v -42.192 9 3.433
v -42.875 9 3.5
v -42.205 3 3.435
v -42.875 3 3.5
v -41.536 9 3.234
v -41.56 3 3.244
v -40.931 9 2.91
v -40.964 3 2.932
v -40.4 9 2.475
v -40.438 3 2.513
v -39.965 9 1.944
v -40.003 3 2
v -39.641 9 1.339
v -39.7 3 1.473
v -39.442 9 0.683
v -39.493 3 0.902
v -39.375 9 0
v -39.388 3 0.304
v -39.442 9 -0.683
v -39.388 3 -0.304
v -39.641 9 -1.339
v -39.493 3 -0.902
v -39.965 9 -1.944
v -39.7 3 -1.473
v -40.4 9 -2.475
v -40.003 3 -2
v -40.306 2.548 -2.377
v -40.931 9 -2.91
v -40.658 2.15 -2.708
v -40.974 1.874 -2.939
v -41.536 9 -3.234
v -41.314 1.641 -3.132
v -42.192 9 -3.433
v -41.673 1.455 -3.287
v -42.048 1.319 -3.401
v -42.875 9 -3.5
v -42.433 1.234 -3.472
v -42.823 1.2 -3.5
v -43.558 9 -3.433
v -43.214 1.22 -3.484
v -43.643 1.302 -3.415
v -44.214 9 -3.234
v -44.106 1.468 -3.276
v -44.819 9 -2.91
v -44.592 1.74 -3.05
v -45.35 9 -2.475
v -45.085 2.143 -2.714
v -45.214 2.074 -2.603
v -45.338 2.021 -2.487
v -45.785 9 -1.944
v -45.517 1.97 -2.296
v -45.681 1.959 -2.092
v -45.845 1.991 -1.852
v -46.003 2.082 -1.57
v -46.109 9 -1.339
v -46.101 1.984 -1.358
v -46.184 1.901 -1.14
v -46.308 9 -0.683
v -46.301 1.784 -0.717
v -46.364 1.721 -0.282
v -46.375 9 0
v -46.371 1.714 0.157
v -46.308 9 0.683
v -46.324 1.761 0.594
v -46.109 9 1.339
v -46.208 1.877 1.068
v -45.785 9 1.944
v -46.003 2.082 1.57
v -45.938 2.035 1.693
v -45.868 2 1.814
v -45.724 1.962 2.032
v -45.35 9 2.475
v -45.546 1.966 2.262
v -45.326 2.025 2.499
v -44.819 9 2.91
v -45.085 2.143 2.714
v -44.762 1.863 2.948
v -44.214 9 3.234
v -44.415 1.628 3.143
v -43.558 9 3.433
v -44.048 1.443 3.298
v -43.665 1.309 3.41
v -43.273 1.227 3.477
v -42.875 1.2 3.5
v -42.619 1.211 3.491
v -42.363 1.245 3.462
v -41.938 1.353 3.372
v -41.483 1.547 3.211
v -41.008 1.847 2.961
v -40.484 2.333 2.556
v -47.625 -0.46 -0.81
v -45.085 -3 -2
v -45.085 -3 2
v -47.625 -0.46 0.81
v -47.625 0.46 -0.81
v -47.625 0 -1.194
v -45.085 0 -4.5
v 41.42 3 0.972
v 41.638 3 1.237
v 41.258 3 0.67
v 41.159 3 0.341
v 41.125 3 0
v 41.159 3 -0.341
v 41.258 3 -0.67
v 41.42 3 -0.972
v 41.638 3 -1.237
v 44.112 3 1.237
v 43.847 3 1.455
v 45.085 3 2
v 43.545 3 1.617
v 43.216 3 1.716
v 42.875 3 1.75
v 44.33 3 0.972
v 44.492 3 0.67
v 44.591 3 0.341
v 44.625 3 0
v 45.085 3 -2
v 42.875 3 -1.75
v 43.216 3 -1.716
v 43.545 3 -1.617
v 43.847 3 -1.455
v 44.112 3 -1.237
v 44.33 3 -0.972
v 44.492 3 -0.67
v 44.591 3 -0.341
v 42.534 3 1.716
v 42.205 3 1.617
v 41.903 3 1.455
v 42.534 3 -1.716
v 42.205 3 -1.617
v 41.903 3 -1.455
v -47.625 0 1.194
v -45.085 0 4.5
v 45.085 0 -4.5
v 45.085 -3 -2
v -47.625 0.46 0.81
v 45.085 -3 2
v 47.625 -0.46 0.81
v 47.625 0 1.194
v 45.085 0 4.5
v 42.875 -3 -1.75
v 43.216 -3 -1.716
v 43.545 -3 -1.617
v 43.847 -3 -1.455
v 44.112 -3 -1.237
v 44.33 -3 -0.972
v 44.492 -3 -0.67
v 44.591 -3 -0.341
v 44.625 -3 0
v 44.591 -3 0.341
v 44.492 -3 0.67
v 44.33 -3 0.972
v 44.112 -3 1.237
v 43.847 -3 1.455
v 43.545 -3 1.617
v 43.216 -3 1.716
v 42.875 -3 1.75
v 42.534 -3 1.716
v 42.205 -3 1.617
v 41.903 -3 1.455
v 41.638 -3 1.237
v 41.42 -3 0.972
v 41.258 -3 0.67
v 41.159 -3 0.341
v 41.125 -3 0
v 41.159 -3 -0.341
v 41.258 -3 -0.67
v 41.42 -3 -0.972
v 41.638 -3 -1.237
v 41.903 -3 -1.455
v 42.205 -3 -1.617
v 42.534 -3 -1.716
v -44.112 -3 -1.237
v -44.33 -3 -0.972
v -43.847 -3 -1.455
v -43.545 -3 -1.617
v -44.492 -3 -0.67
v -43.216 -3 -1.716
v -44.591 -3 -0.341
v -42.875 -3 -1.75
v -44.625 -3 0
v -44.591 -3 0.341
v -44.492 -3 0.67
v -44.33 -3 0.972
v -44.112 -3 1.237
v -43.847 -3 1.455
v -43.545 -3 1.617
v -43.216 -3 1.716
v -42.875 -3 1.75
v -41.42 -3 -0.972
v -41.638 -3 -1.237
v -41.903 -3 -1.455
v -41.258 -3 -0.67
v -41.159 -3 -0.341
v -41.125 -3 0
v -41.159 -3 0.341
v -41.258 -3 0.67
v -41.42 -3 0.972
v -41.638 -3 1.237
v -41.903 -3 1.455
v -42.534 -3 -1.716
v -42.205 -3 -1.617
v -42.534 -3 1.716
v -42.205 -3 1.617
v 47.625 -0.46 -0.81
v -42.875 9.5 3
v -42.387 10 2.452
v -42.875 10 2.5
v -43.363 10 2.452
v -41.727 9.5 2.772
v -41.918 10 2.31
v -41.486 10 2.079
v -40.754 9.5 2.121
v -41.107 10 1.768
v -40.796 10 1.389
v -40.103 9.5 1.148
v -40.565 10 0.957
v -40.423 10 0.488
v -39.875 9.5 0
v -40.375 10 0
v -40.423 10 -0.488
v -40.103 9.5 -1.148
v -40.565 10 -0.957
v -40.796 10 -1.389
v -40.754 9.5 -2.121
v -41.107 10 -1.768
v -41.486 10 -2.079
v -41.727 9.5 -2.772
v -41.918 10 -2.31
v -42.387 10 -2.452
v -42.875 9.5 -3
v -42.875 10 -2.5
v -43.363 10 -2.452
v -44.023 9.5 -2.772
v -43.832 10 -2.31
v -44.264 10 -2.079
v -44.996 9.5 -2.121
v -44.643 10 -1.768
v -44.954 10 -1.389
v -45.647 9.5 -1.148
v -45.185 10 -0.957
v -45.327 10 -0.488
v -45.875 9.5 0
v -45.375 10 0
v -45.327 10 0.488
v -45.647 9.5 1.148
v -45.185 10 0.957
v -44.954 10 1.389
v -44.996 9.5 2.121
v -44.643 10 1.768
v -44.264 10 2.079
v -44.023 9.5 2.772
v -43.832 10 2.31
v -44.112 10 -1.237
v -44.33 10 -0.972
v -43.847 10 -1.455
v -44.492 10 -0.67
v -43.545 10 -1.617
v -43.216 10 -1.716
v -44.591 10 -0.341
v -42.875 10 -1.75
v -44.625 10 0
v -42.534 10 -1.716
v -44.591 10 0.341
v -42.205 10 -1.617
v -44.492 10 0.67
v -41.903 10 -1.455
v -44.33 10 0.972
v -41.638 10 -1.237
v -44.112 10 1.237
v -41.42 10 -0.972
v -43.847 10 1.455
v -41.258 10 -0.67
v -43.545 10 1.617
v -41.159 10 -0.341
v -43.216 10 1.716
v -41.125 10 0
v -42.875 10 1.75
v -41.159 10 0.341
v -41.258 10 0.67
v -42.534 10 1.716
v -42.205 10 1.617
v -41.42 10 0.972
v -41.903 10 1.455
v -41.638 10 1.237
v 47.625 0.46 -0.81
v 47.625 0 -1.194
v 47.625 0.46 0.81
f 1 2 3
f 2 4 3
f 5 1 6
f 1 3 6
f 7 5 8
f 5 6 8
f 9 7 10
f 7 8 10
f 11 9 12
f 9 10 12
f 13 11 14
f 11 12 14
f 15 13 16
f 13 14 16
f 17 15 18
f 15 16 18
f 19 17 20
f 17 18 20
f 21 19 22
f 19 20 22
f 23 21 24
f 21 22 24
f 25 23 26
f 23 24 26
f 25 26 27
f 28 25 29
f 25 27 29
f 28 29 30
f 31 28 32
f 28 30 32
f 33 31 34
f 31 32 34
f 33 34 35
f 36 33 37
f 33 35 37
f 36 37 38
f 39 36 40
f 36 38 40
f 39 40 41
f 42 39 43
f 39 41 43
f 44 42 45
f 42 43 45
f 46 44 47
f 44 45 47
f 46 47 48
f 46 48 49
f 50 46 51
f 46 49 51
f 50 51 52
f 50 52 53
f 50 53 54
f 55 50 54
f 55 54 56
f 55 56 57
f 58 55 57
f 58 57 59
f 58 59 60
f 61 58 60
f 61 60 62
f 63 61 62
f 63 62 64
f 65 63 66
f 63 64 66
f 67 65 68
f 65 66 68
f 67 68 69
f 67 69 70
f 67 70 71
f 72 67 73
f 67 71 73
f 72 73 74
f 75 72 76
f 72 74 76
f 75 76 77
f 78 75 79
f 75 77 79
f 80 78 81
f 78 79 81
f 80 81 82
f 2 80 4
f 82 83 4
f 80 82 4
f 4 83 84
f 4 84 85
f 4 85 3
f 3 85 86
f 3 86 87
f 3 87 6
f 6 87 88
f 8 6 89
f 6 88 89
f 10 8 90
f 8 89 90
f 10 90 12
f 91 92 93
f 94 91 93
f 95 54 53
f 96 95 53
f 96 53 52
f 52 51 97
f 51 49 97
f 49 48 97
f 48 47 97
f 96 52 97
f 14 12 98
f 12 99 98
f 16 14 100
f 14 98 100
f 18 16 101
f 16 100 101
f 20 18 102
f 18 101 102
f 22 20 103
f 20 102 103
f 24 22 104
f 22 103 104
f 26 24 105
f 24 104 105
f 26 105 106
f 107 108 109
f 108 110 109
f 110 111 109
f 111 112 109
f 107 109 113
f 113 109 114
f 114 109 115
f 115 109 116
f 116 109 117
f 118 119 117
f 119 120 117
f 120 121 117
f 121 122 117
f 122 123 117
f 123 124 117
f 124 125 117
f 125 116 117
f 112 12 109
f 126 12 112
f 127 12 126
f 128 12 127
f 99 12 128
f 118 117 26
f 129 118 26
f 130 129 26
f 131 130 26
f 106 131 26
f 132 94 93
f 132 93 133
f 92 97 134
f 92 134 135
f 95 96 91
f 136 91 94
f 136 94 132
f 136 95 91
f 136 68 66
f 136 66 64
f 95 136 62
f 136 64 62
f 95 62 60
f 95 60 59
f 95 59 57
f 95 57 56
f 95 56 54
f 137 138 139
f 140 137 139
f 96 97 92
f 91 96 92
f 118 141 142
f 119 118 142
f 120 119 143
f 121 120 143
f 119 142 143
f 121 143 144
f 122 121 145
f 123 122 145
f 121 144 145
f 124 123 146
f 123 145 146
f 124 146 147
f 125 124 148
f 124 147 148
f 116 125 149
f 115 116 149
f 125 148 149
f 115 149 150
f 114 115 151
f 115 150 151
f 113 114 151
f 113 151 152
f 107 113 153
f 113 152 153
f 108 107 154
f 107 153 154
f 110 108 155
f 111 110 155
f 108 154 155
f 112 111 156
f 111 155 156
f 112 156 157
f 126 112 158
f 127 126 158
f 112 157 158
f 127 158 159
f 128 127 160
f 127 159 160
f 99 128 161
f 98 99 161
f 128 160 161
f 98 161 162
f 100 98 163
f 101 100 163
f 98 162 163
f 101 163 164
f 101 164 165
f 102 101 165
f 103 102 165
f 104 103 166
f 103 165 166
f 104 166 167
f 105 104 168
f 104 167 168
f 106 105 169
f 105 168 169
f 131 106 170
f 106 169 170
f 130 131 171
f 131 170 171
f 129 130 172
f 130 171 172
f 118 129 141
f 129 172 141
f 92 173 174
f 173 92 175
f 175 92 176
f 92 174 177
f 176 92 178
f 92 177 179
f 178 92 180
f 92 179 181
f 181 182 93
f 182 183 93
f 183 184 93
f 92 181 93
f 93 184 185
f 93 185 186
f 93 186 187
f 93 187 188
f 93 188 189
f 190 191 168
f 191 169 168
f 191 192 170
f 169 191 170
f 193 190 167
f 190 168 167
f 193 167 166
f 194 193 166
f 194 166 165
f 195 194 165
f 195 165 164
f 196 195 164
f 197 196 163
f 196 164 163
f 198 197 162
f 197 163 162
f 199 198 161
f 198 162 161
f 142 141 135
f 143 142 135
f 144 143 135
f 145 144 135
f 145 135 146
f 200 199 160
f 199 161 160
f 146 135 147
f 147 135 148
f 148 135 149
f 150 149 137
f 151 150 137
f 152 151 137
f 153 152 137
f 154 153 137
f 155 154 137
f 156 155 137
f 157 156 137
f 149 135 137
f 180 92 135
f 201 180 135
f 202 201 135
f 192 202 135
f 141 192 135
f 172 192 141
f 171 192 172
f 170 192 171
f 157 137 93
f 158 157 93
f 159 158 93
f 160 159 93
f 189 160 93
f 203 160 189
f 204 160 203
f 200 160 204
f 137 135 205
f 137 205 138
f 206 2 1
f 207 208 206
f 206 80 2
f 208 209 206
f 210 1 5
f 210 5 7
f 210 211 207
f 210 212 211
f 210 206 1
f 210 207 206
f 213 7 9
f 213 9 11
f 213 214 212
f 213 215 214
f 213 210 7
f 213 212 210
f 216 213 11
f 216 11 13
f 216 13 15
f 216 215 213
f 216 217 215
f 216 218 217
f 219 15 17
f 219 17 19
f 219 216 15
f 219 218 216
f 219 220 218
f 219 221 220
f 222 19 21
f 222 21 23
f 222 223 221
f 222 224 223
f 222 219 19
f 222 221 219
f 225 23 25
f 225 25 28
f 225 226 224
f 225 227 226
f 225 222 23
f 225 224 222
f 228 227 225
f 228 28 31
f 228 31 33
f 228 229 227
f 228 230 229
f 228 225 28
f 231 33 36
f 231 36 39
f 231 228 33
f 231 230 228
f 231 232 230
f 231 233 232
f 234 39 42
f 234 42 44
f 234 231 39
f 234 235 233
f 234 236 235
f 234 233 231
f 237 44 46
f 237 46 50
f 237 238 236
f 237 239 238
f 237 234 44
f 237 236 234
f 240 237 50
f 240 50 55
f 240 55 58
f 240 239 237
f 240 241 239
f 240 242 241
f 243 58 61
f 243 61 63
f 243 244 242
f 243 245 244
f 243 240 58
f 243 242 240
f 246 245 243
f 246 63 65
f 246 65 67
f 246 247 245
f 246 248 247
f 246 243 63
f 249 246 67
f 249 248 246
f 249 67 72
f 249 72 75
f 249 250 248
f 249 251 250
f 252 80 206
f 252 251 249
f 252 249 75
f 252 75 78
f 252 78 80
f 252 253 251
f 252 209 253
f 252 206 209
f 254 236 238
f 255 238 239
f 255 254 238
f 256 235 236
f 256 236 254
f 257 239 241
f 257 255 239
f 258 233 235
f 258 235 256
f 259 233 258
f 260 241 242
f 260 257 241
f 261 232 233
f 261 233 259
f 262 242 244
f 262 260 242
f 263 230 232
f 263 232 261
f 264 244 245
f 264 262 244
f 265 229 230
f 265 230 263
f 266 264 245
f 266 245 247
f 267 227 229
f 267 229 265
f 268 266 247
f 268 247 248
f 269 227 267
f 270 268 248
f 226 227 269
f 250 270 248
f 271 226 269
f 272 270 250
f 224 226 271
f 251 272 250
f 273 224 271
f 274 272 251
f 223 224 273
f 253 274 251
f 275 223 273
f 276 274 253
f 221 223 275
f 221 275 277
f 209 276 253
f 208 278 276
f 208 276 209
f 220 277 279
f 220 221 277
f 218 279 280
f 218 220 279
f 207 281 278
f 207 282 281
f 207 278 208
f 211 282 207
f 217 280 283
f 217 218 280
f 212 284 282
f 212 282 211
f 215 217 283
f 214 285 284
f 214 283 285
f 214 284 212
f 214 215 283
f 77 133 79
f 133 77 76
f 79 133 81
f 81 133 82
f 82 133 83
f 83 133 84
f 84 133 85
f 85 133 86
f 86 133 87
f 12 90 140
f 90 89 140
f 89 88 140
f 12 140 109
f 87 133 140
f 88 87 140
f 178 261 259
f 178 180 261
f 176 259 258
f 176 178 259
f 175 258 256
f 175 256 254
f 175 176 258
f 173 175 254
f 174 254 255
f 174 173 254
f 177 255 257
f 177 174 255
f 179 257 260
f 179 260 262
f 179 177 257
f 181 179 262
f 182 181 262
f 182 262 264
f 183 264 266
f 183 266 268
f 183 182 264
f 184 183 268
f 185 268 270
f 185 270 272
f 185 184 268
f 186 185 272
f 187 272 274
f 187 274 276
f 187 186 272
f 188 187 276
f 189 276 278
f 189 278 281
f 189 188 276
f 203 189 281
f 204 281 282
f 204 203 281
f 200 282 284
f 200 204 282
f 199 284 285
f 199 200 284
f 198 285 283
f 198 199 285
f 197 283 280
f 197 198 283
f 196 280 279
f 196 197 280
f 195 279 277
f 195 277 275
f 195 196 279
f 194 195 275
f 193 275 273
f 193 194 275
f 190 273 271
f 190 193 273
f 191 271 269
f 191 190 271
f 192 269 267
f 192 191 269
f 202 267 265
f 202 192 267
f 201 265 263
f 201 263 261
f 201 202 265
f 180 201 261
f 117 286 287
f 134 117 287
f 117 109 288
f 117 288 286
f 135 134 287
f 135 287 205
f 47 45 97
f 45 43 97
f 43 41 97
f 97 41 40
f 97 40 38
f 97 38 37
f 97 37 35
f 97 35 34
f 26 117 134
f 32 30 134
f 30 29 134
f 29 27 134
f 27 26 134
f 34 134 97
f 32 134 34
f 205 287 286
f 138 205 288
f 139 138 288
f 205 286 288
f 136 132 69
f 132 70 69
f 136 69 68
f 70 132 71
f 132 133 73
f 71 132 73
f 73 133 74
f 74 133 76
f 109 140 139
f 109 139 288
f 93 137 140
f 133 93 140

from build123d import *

# Parameters (mm, degrees)
BOSS_EXTRUDE1_DEPTH             = 47.625
SKETCH2_R                       = 1.75
CUT_EXTRUDE1_DEPTH              = 6
CHAMFER1_SIZE                   = 2.54
CHAMFER2_SIZE                   = 2.54
SKETCH3_R                       = 3.5
SKETCH3_R_2                     = 1.75
BOSS_EXTRUDE2_DEPTH             = 7
BOSS_EXTRUDE2_DIRECTION_2_REACH = 50.212
CHAMFER3_SIZE                   = 1


with BuildPart() as part:
    # Sketch1 → Boss-Extrude1 (new, symmetric)
    with BuildSketch(Plane(origin=(0, 0, 0), x_dir=(0, 0, -1), z_dir=(1, 0, 0))):
        Polygon((-2, -3), (-4.5, 0), (-2, 3), (2, 3), (4.5, 0), (2, -3), align=None)
    extrude(amount=BOSS_EXTRUDE1_DEPTH, both=True)

    # Sketch2 → Cut-Extrude1 (cut)
    with BuildSketch(Plane.XZ.offset(3)):
        with Locations(Location((42.875, 0, 0), (0, 0, 270))):
            Circle(SKETCH2_R)
    cut_extrude1 = extrude(amount=-CUT_EXTRUDE1_DEPTH, mode=Mode.SUBTRACT)

    # Chamfer1
    chamfer1_edges = [part.edges().sort_by_distance(p)[0] for p in [
        (47.625, -1.5, -3.25),
        (47.625, -3, 0),
        (47.625, -1.5, 3.25),
        (47.625, 1.5, 3.25),
        (47.625, 3, 0),
        (47.625, 1.5, -3.25),
    ]]
    chamfer(chamfer1_edges, length=CHAMFER1_SIZE)

    # Mirror4: Cut-Extrude1 across plane
    add(cut_extrude1.mirror(Plane(origin=(0, 0, 0), x_dir=(0, 0, 1), z_dir=(1, 0, 0))), mode=Mode.SUBTRACT)

    # Chamfer2
    chamfer2_edges = [part.edges().sort_by_distance(p)[0] for p in [
        (-47.625, 1.5, 3.25),
        (-47.625, -1.5, 3.25),
        (-47.625, -3, 0),
        (-47.625, -1.5, -3.25),
        (-47.625, 1.5, -3.25),
        (-47.625, 3, 0),
    ]]
    chamfer(chamfer2_edges, length=CHAMFER2_SIZE)

    # Sketch3 → Boss-Extrude2 (add)
    with BuildSketch(Plane(origin=(0, 3, 0), x_dir=(1, 0, 0), z_dir=(0, 1, 0))):
        with Locations(Location((-42.875, 0, 0), (0, 0, 270))):
            Circle(SKETCH3_R)
        with Locations(Location((-42.875, 0, 0), (0, 0, 90))):
            Circle(SKETCH3_R_2, mode=Mode.SUBTRACT)
    extrude(amount=BOSS_EXTRUDE2_DEPTH)

    # Sketch3 → Boss-Extrude2 direction 2 (add, up to next)
    with BuildSketch(Plane(origin=(0, 3, 0), x_dir=(1, 0, 0), z_dir=(0, 1, 0)), mode=Mode.PRIVATE) as boss_extrude2_direction_2_sk1:
        with Locations(Location((-42.875, 0, 0), (0, 0, 270))):
            Circle(SKETCH3_R)
        with Locations(Location((-42.875, 0, 0), (0, 0, 90))):
            Circle(SKETCH3_R_2, mode=Mode.SUBTRACT)
    boss_extrude2_direction_2_tool1 = extrude(boss_extrude2_direction_2_sk1.sketch, amount=-BOSS_EXTRUDE2_DIRECTION_2_REACH, mode=Mode.PRIVATE) - part.part
    add(boss_extrude2_direction_2_tool1.solids().sort_by_distance((-42.875, 3, -3.401005))[0])

    # Chamfer3
    chamfer3_edges = [part.edges().sort_by_distance(p)[0] for p in [
        (-42.875, 10, -3.5),
    ]]
    chamfer(chamfer3_edges, length=CHAMFER3_SIZE)


solid = part.part
